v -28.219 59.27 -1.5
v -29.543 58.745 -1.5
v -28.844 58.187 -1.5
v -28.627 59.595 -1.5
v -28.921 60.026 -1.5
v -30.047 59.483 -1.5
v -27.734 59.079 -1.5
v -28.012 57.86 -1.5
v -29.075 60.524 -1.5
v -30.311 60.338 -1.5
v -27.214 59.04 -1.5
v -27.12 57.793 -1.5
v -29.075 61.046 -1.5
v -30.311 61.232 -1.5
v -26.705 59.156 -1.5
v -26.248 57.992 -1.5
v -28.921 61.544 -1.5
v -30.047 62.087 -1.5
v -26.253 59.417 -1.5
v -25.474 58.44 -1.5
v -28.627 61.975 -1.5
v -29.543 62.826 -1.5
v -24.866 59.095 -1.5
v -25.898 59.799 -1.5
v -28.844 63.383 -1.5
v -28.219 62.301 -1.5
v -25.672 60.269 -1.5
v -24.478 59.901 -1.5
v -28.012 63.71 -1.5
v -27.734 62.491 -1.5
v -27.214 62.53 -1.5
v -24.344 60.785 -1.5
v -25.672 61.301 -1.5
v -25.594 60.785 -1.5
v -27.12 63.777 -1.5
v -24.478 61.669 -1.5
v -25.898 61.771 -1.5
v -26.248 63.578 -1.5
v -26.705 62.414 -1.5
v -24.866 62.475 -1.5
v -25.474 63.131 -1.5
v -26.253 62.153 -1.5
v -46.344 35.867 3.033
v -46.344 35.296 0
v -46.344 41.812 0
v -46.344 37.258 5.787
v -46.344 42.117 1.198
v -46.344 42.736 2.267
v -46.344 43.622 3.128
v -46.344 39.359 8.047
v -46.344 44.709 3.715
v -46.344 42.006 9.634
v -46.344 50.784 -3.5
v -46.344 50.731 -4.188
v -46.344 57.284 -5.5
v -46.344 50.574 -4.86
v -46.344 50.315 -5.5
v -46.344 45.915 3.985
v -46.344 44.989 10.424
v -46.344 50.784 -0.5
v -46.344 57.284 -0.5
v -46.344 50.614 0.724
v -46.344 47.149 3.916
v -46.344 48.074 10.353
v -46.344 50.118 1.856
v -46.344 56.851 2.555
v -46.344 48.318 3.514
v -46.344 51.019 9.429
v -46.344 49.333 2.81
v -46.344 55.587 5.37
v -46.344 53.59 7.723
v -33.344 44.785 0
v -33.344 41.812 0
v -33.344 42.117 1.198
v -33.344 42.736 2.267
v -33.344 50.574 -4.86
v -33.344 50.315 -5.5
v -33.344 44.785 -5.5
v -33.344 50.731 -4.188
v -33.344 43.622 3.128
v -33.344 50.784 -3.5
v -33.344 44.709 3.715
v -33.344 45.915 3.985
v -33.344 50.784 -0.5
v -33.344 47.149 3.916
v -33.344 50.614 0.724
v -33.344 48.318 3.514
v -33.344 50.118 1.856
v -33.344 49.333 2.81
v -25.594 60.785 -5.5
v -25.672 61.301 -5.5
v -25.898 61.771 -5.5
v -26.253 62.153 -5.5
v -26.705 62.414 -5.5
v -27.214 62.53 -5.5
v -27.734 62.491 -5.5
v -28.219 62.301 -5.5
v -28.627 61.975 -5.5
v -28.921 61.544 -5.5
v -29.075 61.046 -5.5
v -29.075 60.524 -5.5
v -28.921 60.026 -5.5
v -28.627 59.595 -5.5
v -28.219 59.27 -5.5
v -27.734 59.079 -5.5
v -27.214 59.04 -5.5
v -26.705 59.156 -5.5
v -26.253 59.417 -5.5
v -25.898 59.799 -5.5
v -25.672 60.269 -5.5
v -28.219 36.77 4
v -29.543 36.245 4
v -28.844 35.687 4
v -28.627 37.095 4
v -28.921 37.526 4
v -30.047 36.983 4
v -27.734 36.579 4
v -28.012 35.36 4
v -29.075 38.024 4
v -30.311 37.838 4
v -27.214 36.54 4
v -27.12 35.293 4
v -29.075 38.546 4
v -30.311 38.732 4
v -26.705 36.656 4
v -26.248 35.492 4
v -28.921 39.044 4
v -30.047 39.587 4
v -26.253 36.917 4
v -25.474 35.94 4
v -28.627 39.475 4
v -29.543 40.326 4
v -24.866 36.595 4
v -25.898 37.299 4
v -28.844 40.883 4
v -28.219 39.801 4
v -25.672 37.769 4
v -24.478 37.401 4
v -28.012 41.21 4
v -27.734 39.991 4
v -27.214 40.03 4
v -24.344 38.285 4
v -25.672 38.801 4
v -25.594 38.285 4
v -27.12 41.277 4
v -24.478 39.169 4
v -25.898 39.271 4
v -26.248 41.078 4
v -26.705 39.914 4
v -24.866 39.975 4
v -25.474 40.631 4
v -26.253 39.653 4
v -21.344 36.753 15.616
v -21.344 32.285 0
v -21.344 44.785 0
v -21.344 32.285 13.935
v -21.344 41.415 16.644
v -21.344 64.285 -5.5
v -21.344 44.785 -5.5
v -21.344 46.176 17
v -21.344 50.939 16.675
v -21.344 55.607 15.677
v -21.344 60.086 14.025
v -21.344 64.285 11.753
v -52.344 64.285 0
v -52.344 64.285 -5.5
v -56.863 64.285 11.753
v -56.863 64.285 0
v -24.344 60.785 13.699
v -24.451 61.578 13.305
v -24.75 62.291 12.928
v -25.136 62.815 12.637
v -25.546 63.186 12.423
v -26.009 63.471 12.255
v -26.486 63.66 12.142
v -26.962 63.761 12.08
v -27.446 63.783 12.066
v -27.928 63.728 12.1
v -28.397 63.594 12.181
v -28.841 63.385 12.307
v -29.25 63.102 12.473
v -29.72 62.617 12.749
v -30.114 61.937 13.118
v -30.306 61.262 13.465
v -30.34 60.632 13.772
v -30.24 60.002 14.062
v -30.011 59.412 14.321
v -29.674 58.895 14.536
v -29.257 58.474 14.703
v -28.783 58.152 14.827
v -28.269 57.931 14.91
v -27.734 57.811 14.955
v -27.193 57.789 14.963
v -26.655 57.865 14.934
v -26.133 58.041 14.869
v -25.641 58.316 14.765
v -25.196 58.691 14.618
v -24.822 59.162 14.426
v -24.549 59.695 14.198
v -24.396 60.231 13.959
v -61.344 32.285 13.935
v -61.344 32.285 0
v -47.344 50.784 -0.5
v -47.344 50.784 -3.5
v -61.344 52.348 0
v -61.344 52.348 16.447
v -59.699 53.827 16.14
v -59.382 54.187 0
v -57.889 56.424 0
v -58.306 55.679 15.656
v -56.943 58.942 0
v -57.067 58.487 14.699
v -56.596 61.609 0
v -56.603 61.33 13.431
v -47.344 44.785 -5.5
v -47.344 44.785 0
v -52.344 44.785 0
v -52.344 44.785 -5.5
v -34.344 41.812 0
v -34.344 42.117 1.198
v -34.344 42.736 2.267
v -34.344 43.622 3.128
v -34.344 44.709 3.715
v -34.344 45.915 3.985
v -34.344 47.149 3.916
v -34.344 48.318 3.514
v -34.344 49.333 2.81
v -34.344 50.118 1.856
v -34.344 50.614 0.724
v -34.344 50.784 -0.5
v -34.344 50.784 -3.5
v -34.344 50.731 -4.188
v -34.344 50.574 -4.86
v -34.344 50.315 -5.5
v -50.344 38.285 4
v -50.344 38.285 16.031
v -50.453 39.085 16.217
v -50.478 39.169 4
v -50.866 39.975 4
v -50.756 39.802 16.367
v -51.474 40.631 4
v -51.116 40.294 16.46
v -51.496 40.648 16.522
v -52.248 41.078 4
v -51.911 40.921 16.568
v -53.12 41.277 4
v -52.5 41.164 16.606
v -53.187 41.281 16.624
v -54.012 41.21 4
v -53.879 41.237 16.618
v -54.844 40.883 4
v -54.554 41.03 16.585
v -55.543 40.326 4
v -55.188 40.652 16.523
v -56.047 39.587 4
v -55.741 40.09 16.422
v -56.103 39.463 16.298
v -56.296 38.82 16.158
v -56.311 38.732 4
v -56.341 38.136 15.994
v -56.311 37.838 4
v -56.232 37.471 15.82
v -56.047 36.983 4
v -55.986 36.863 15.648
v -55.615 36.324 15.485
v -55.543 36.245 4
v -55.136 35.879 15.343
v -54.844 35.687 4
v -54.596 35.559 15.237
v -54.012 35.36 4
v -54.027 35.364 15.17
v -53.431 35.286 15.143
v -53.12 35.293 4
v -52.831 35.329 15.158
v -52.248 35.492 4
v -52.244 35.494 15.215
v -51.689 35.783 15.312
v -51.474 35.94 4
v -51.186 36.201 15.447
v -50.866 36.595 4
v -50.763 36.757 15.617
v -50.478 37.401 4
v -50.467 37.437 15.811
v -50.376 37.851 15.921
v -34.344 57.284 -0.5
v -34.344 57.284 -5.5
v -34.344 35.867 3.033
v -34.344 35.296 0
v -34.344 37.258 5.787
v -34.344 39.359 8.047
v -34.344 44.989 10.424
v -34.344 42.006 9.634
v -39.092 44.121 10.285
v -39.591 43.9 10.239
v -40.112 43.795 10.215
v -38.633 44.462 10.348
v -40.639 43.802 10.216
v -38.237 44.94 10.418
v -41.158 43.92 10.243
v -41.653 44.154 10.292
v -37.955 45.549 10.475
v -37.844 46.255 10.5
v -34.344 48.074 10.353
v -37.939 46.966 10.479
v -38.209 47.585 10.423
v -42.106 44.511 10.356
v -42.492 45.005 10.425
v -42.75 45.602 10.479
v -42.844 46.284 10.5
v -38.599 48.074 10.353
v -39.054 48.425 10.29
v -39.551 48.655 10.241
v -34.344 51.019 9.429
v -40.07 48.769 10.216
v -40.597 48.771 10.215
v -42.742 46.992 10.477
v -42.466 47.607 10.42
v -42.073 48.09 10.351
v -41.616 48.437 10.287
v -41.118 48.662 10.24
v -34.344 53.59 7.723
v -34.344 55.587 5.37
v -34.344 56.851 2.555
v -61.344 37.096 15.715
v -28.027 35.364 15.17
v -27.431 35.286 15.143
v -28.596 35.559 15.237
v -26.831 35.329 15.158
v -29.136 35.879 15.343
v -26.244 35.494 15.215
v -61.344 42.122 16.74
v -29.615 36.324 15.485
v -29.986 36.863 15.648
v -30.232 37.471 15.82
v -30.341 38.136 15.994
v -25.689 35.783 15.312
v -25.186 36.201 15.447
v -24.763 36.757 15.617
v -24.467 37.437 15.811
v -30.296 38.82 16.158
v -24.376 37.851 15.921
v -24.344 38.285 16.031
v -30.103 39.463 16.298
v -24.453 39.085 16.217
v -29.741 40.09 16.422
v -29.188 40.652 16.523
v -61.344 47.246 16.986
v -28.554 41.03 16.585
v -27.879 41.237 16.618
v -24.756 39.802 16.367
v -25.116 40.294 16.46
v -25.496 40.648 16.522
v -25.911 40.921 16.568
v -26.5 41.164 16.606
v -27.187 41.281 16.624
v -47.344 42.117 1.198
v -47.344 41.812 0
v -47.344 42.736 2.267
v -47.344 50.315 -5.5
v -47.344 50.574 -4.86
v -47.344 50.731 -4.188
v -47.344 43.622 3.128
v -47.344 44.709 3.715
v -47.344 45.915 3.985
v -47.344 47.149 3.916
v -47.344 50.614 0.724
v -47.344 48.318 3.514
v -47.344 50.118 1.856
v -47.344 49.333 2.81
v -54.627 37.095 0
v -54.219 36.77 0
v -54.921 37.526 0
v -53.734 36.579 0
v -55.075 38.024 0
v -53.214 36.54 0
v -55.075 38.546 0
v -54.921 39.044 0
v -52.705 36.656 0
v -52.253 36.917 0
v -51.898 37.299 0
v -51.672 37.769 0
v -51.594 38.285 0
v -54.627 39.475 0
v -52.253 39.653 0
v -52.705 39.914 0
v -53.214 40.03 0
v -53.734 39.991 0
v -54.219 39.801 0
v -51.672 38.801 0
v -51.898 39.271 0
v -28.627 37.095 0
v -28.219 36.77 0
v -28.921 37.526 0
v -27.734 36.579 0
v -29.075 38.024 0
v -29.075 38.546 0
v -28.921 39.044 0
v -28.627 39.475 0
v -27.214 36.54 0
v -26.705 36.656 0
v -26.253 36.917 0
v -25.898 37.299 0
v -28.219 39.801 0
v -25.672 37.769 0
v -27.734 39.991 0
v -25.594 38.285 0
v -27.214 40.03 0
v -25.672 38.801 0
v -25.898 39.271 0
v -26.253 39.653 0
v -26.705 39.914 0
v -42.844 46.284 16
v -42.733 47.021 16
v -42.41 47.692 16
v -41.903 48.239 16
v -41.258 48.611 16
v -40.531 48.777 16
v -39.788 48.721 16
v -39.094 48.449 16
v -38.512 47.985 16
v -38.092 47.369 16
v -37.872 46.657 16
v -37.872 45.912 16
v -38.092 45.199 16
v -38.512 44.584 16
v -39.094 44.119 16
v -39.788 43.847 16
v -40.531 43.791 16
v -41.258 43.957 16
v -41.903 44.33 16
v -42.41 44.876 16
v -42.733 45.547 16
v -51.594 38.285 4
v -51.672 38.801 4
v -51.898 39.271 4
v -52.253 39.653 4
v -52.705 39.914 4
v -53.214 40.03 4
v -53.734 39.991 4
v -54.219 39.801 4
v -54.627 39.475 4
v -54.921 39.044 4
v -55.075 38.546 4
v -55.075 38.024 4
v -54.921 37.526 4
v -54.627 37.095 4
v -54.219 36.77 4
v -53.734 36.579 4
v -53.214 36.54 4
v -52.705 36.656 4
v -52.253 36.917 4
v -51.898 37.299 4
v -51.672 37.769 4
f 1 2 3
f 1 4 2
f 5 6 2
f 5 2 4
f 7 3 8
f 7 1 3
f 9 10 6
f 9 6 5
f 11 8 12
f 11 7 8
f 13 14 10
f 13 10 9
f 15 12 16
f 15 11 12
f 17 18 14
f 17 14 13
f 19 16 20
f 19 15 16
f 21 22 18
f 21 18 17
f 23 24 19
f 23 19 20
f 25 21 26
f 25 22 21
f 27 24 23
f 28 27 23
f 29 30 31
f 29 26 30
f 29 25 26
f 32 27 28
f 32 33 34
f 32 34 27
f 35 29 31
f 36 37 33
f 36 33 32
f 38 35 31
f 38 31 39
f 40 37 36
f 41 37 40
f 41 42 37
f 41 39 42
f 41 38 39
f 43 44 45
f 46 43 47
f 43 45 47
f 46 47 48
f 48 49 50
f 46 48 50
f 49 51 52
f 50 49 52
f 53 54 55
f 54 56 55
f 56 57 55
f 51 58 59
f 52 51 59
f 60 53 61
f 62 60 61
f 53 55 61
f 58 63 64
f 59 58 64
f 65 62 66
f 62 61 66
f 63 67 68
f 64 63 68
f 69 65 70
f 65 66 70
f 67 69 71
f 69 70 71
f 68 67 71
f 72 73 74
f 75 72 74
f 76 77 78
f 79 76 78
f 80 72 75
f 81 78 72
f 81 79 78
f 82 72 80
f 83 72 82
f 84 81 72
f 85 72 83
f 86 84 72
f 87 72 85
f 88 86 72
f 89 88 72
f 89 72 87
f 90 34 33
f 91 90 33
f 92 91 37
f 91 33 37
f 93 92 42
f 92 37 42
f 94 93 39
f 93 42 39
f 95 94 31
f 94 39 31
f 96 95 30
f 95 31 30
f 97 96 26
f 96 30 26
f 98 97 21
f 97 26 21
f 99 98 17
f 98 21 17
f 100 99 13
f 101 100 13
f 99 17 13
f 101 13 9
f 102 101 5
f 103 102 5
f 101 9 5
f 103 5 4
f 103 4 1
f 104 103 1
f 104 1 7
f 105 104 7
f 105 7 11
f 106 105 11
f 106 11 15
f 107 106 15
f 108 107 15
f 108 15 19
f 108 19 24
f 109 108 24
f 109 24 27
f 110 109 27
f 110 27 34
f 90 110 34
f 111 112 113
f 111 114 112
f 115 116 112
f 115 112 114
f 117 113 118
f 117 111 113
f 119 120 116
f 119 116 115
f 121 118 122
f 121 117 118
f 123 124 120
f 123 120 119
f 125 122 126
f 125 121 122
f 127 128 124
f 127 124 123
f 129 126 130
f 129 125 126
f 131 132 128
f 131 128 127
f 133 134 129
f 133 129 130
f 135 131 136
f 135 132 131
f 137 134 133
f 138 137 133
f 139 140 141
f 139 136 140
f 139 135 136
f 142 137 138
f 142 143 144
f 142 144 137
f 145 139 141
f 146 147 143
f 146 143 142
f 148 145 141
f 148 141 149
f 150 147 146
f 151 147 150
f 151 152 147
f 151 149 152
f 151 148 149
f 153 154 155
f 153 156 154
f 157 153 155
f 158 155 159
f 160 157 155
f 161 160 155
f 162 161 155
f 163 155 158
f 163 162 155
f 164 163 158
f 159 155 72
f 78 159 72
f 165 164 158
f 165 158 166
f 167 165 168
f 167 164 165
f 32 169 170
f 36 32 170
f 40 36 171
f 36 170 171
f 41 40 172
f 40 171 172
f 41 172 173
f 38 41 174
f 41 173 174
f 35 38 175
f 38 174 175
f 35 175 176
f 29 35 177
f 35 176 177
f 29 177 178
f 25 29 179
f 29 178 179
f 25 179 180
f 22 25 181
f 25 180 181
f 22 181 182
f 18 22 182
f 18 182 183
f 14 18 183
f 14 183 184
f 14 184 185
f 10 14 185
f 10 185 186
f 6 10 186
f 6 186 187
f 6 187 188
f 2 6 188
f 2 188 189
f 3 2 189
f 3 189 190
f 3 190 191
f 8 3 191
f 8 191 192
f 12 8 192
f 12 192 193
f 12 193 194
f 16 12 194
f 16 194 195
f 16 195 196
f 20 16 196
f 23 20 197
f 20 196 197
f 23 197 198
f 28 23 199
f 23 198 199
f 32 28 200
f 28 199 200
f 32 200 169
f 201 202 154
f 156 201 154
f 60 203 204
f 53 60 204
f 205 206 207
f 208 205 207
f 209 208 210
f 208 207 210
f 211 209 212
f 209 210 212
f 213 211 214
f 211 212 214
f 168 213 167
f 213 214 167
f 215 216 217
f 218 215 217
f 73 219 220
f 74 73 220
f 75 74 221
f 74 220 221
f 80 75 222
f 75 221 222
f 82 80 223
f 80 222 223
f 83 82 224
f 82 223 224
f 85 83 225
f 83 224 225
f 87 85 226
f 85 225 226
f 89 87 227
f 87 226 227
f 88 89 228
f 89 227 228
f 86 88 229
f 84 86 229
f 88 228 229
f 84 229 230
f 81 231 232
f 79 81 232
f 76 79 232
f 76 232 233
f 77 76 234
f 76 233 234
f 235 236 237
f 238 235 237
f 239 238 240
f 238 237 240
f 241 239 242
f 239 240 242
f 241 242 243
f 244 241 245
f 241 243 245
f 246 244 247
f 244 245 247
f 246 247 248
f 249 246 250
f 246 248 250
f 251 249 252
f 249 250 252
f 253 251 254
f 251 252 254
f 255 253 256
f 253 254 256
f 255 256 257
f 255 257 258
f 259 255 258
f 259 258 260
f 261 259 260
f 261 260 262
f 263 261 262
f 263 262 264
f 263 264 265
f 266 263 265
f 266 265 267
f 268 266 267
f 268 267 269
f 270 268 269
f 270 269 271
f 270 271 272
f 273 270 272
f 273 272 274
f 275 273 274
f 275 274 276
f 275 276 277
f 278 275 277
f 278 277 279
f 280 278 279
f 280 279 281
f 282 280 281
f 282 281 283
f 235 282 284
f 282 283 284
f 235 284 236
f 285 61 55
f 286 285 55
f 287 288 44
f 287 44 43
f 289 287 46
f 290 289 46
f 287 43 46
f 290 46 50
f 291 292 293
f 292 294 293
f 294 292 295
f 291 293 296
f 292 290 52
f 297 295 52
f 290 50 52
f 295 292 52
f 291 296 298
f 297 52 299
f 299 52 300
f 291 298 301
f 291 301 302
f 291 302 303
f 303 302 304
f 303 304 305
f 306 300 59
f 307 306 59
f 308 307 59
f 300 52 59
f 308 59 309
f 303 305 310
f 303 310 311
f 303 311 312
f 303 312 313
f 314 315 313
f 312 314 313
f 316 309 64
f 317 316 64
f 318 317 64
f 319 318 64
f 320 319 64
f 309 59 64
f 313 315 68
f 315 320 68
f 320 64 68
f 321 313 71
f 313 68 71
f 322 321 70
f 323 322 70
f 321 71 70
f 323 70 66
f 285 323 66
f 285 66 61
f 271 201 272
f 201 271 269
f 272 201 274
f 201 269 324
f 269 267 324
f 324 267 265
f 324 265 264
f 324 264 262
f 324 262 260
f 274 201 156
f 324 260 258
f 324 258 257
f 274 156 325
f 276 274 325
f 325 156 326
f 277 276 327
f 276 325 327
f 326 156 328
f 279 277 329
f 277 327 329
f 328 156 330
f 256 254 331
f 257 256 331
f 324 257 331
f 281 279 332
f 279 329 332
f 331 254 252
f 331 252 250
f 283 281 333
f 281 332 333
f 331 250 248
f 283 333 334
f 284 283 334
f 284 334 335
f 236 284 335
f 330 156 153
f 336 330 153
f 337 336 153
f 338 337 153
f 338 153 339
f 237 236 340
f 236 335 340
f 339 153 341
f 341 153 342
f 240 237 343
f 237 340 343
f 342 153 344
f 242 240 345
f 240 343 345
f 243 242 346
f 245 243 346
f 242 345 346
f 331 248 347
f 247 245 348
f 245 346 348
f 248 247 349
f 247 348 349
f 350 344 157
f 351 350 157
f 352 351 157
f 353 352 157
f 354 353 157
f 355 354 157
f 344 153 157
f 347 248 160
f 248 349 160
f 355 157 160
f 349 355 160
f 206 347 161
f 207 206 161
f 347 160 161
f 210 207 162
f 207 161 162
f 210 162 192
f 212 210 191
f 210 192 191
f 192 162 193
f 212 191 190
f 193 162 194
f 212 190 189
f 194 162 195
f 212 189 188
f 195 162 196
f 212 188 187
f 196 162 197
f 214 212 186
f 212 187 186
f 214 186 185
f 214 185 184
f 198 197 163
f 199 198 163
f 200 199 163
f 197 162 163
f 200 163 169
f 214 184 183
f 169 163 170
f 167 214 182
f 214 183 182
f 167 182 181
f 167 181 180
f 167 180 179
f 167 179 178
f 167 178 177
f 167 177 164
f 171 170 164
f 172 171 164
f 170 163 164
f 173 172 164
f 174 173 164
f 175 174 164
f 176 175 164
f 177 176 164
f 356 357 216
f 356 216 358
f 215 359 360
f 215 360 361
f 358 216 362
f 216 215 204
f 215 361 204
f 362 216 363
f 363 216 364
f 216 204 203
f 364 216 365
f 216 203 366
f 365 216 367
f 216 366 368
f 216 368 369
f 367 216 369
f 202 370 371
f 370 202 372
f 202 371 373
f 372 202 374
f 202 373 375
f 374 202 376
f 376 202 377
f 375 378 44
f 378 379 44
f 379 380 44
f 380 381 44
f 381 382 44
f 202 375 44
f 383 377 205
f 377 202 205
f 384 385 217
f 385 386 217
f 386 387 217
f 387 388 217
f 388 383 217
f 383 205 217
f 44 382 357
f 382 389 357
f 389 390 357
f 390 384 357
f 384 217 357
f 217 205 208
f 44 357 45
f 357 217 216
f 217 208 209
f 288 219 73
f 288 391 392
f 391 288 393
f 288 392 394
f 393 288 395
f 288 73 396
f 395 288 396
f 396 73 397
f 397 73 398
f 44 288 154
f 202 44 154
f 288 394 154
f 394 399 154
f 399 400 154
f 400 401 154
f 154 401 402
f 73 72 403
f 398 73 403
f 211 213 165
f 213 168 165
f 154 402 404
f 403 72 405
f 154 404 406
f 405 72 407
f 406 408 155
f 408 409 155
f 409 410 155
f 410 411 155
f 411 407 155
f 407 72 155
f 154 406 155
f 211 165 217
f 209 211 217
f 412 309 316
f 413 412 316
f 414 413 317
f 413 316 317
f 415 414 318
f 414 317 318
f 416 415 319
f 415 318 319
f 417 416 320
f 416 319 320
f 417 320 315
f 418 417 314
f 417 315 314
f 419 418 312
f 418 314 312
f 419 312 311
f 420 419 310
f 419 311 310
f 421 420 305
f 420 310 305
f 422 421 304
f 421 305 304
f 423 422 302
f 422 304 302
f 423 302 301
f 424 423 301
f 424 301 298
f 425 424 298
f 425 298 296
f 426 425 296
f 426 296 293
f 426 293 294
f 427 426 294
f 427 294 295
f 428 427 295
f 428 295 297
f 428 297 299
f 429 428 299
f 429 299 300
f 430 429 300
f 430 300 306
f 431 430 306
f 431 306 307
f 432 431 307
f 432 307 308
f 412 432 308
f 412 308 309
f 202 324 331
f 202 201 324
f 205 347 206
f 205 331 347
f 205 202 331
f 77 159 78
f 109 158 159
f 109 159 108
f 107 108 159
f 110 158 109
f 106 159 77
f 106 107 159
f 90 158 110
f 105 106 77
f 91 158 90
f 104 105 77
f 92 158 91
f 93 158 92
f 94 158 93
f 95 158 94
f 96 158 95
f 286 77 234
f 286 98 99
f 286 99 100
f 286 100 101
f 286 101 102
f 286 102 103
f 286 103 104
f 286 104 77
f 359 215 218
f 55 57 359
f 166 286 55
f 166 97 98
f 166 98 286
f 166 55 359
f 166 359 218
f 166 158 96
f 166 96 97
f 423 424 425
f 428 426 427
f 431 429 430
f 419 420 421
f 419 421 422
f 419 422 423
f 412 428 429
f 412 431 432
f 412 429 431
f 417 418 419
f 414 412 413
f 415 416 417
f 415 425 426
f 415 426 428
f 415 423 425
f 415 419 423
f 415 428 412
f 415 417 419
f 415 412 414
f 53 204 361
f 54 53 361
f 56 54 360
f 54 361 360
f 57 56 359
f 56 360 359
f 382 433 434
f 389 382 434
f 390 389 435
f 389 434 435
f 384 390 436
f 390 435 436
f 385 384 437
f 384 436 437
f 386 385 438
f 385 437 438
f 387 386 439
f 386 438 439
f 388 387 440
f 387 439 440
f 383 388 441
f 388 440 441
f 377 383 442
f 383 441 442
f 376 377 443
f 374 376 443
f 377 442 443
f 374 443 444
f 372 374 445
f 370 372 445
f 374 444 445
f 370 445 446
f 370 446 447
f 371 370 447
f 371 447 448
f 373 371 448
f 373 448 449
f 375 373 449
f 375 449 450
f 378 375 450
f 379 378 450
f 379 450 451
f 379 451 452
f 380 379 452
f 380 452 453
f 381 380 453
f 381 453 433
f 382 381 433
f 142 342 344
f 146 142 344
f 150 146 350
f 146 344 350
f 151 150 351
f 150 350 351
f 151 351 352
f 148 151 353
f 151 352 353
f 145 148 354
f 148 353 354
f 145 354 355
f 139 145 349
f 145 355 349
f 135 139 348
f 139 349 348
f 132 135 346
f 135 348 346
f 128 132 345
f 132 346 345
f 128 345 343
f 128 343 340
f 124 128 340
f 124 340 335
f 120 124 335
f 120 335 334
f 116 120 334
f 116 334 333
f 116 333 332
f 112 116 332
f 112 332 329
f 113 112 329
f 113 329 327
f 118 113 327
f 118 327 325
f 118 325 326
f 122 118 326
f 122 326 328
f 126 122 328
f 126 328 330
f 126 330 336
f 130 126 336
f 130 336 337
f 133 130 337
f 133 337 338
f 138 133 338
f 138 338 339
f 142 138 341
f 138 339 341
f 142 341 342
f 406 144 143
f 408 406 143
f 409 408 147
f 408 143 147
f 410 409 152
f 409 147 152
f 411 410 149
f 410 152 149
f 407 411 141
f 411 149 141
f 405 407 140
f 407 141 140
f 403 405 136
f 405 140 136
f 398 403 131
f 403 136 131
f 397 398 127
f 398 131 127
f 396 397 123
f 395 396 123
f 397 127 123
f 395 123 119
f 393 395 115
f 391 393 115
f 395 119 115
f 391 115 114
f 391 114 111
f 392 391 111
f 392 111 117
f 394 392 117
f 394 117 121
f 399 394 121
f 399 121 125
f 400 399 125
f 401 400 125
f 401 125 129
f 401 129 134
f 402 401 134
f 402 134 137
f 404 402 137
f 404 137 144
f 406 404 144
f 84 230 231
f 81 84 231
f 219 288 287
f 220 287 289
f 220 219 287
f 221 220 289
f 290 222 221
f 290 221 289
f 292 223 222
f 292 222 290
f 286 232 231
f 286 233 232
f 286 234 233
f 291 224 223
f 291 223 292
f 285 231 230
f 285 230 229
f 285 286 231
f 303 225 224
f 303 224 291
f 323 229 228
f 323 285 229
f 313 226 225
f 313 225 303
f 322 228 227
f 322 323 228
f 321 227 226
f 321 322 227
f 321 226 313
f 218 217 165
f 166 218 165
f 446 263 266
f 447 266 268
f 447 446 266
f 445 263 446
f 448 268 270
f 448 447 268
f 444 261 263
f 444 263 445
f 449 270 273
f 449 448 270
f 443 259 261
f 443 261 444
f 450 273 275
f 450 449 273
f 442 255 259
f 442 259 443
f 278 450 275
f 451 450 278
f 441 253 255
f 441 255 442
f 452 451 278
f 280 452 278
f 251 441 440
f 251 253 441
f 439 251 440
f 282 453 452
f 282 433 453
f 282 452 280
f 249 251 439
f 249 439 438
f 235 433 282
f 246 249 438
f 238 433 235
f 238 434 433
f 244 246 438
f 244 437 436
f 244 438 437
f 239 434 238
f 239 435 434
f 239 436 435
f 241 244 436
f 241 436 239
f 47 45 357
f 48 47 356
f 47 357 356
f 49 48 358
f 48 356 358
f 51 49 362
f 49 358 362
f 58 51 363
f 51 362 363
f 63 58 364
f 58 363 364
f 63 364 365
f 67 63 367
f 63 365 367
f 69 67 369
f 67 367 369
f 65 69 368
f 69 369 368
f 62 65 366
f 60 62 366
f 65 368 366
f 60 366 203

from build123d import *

# Parameters (mm, degrees)
SKETCH1_W               = 40
SKETCH1_H               = 32
BOSS_EXTRUDE1_DEPTH     = 17
SKETCH3_W               = 31
SKETCH3_H               = 19.5
BOSS_EXTRUDE2_DEPTH     = 5.5
CUT_EXTRUDE1_REACH      = 93.662
SKETCH2_R               = 1.75
CUT_EXTRUDE2_DEPTH      = 6
CUT_EXTRUDE2_DEPTH_BACK = 6
SKETCH5_R               = 2.5
CUT_EXTRUDE3_DEPTH      = 21.5
SKETCH6_R               = 11.75
CUT_EXTRUDE4_DEPTH      = 22.5
CUT_EXTRUDE5_DEPTH      = 7
CUT_EXTRUDE5_DEPTH_BACK = 7
SKETCH9_R               = 3
CUT_EXTRUDE7_DEPTH      = 13
SKETCH10_R              = 3
CUT_EXTRUDE8_DEPTH      = 18.5
CUT_EXTRUDE6_REACH      = 79.599


with BuildPart() as part:
    # Sketch1 → Boss-Extrude1 (new body)
    with BuildSketch(Plane.XY):
        with Locations((-41.344294363, 48.285102326)):
            Rectangle(SKETCH1_W, SKETCH1_H)
    extrude(amount=BOSS_EXTRUDE1_DEPTH)

    # Sketch3 → Boss-Extrude2 (add)
    with BuildSketch(Plane(origin=(0, 0, 0), x_dir=(-1, 0, 0), z_dir=(0, 0, -1))):
        with Locations((36.844294363, 54.535102326)):
            Rectangle(SKETCH3_W, SKETCH3_H)
    extrude(amount=BOSS_EXTRUDE2_DEPTH)

    # Cut-Extrude1: up to this face of the body (flat: up to its plane)
    cut_extrude1_end = Plane(part.part.faces().sort_by_distance((-36.844294363, 54.535102326, -5.5))[0])
    # Sketch2 → Cut-Extrude1 (cut, up to the picked face)
    with BuildSketch(Plane.XY.offset(17), mode=Mode.PRIVATE) as cut_extrude1_sk1:
        with Locations((-27.344294363, 60.785102326)):
            Circle(SKETCH2_R)
    cut_extrude1_tool1 = split(extrude(cut_extrude1_sk1.sketch, amount=-CUT_EXTRUDE1_REACH, mode=Mode.PRIVATE), bisect_by=cut_extrude1_end, keep=Keep.BOTH, mode=Mode.PRIVATE)
    # Sketch2 → Cut-Extrude1 (cut, up to the picked face)
    with BuildSketch(Plane.XY.offset(17), mode=Mode.PRIVATE) as cut_extrude1_sk2:
        with Locations((-27.344294363, 38.285102326)):
            Circle(SKETCH2_R)
    cut_extrude1_tool2 = split(extrude(cut_extrude1_sk2.sketch, amount=-CUT_EXTRUDE1_REACH, mode=Mode.PRIVATE), bisect_by=cut_extrude1_end, keep=Keep.BOTH, mode=Mode.PRIVATE)
    # Sketch2 → Cut-Extrude1 (cut, up to the picked face)
    with BuildSketch(Plane.XY.offset(17), mode=Mode.PRIVATE) as cut_extrude1_sk3:
        with Locations((-53.344294363, 38.285102326)):
            Circle(SKETCH2_R)
    cut_extrude1_tool3 = split(extrude(cut_extrude1_sk3.sketch, amount=-CUT_EXTRUDE1_REACH, mode=Mode.PRIVATE), bisect_by=cut_extrude1_end, keep=Keep.BOTH, mode=Mode.PRIVATE)
    add(cut_extrude1_tool1.solids().sort_by(Axis((-27.344294, 60.785102, 17), (0, 0, -1)))[0], mode=Mode.SUBTRACT)
    add(cut_extrude1_tool2.solids().sort_by(Axis((-27.344294, 38.285102, 17), (0, 0, -1)))[0], mode=Mode.SUBTRACT)
    add(cut_extrude1_tool3.solids().sort_by(Axis((-53.344294, 38.285102, 17), (0, 0, -1)))[0], mode=Mode.SUBTRACT)

    # Sketch4 → Cut-Extrude2 (cut, two sides: drawn at the far end of the back side and taken through both)
    with BuildSketch(Plane(origin=(-40.344294363, 0, 0), x_dir=(0, 0, -1), z_dir=(1, 0, 0)).offset(-CUT_EXTRUDE2_DEPTH_BACK)):
        with BuildLine():
            Line((0.5, 57.284133416), (11.5, 57.284133416))
            Line((11.5, 57.284133416), (11.5, 46.284133416))
            ThreePointArc((11.5, 46.284133416), (-7.278174593, 38.505958823), (0.5, 57.284133416))
        make_face()
    extrude(amount=CUT_EXTRUDE2_DEPTH + CUT_EXTRUDE2_DEPTH_BACK, mode=Mode.SUBTRACT)

    # Sketch5 → Cut-Extrude3 (cut)
    with BuildSketch(Plane(origin=(0, 0, -5.5), x_dir=(-1, 0, 0), z_dir=(0, 0, -1))):
        with Locations((40.344294363, 46.284133416)):
            Circle(SKETCH5_R)
    extrude(amount=-CUT_EXTRUDE3_DEPTH, mode=Mode.SUBTRACT)

    # Sketch6 → Cut-Extrude4 (cut)
    with BuildSketch(Plane.XY.offset(17)):
        with Locations((-68.344294363, 61.785102326)):
            Circle(SKETCH6_R)
    extrude(amount=-CUT_EXTRUDE4_DEPTH, mode=Mode.SUBTRACT)

    # Sketch7 → Cut-Extrude5 (cut, two sides: drawn at the far end of the back side and taken through both)
    with BuildSketch(Plane(origin=(-40.344294363, 0, 0), x_dir=(0, 0, -1), z_dir=(1, 0, 0)).offset(-CUT_EXTRUDE5_DEPTH_BACK)):
        with BuildLine():
            Line((0.5, 50.784133416), (3.5, 50.784133416))
            ThreePointArc((3.5, 50.784133416), (8, 46.284133416), (3.5, 41.784133416))
            Line((3.5, 41.784133416), (0.5, 41.784133416))
            ThreePointArc((0.5, 41.784133416), (-4, 46.284133416), (0.5, 50.784133416))
        make_face()
    extrude(amount=CUT_EXTRUDE5_DEPTH + CUT_EXTRUDE5_DEPTH_BACK, mode=Mode.SUBTRACT)

    # Sketch9 → Cut-Extrude7 (cut)
    with BuildSketch(Plane.XY.offset(17)):
        with Locations((-27.344294363, 38.285102326)):
            Circle(SKETCH9_R)
        with Locations((-53.344294363, 38.285102326)):
            Circle(SKETCH9_R)
    extrude(amount=-CUT_EXTRUDE7_DEPTH, mode=Mode.SUBTRACT)

    # Sketch10 → Cut-Extrude8 (cut)
    with BuildSketch(Plane.XY.offset(17)):
        with Locations((-27.344294363, 60.785102326)):
            Circle(SKETCH10_R)
    extrude(amount=-CUT_EXTRUDE8_DEPTH, mode=Mode.SUBTRACT)

    # Cut-Extrude6: up to this face of the body (flat: up to its plane)
    cut_extrude6_end = Plane(part.part.faces().sort_by_distance((-61.344294363, 42.316455804, 8.5))[0])
    # Sketch8 → Cut-Extrude6 (cut, up to the picked face)
    with BuildSketch(Plane(origin=(-21.344294363, 0, 0), x_dir=(0, 0, -1), z_dir=(1, 0, 0)), mode=Mode.PRIVATE) as cut_extrude6_sk1:
        with BuildLine():
            Line((-9.261769408, 67.698643379), (-19.68345764, 67.698643379))
            Line((-19.68345764, 67.698643379), (-19.68345764, 31.088127449))
            Line((-19.68345764, 31.088127449), (-13.3551738, 31.088127449))
            ThreePointArc((-13.3551738, 31.088127449), (-16.792545144, 50.006557071), (-9.261769408, 67.698643379))
        make_face()
    cut_extrude6_tool1 = split(extrude(cut_extrude6_sk1.sketch, amount=-CUT_EXTRUDE6_REACH, mode=Mode.PRIVATE), bisect_by=cut_extrude6_end, keep=Keep.BOTH, mode=Mode.PRIVATE)
    add(cut_extrude6_tool1.solids().sort_by(Axis((-21.344294, 51.901758, 16.96141), (-1, 0, 0)))[0], mode=Mode.SUBTRACT)


solid = part.part
